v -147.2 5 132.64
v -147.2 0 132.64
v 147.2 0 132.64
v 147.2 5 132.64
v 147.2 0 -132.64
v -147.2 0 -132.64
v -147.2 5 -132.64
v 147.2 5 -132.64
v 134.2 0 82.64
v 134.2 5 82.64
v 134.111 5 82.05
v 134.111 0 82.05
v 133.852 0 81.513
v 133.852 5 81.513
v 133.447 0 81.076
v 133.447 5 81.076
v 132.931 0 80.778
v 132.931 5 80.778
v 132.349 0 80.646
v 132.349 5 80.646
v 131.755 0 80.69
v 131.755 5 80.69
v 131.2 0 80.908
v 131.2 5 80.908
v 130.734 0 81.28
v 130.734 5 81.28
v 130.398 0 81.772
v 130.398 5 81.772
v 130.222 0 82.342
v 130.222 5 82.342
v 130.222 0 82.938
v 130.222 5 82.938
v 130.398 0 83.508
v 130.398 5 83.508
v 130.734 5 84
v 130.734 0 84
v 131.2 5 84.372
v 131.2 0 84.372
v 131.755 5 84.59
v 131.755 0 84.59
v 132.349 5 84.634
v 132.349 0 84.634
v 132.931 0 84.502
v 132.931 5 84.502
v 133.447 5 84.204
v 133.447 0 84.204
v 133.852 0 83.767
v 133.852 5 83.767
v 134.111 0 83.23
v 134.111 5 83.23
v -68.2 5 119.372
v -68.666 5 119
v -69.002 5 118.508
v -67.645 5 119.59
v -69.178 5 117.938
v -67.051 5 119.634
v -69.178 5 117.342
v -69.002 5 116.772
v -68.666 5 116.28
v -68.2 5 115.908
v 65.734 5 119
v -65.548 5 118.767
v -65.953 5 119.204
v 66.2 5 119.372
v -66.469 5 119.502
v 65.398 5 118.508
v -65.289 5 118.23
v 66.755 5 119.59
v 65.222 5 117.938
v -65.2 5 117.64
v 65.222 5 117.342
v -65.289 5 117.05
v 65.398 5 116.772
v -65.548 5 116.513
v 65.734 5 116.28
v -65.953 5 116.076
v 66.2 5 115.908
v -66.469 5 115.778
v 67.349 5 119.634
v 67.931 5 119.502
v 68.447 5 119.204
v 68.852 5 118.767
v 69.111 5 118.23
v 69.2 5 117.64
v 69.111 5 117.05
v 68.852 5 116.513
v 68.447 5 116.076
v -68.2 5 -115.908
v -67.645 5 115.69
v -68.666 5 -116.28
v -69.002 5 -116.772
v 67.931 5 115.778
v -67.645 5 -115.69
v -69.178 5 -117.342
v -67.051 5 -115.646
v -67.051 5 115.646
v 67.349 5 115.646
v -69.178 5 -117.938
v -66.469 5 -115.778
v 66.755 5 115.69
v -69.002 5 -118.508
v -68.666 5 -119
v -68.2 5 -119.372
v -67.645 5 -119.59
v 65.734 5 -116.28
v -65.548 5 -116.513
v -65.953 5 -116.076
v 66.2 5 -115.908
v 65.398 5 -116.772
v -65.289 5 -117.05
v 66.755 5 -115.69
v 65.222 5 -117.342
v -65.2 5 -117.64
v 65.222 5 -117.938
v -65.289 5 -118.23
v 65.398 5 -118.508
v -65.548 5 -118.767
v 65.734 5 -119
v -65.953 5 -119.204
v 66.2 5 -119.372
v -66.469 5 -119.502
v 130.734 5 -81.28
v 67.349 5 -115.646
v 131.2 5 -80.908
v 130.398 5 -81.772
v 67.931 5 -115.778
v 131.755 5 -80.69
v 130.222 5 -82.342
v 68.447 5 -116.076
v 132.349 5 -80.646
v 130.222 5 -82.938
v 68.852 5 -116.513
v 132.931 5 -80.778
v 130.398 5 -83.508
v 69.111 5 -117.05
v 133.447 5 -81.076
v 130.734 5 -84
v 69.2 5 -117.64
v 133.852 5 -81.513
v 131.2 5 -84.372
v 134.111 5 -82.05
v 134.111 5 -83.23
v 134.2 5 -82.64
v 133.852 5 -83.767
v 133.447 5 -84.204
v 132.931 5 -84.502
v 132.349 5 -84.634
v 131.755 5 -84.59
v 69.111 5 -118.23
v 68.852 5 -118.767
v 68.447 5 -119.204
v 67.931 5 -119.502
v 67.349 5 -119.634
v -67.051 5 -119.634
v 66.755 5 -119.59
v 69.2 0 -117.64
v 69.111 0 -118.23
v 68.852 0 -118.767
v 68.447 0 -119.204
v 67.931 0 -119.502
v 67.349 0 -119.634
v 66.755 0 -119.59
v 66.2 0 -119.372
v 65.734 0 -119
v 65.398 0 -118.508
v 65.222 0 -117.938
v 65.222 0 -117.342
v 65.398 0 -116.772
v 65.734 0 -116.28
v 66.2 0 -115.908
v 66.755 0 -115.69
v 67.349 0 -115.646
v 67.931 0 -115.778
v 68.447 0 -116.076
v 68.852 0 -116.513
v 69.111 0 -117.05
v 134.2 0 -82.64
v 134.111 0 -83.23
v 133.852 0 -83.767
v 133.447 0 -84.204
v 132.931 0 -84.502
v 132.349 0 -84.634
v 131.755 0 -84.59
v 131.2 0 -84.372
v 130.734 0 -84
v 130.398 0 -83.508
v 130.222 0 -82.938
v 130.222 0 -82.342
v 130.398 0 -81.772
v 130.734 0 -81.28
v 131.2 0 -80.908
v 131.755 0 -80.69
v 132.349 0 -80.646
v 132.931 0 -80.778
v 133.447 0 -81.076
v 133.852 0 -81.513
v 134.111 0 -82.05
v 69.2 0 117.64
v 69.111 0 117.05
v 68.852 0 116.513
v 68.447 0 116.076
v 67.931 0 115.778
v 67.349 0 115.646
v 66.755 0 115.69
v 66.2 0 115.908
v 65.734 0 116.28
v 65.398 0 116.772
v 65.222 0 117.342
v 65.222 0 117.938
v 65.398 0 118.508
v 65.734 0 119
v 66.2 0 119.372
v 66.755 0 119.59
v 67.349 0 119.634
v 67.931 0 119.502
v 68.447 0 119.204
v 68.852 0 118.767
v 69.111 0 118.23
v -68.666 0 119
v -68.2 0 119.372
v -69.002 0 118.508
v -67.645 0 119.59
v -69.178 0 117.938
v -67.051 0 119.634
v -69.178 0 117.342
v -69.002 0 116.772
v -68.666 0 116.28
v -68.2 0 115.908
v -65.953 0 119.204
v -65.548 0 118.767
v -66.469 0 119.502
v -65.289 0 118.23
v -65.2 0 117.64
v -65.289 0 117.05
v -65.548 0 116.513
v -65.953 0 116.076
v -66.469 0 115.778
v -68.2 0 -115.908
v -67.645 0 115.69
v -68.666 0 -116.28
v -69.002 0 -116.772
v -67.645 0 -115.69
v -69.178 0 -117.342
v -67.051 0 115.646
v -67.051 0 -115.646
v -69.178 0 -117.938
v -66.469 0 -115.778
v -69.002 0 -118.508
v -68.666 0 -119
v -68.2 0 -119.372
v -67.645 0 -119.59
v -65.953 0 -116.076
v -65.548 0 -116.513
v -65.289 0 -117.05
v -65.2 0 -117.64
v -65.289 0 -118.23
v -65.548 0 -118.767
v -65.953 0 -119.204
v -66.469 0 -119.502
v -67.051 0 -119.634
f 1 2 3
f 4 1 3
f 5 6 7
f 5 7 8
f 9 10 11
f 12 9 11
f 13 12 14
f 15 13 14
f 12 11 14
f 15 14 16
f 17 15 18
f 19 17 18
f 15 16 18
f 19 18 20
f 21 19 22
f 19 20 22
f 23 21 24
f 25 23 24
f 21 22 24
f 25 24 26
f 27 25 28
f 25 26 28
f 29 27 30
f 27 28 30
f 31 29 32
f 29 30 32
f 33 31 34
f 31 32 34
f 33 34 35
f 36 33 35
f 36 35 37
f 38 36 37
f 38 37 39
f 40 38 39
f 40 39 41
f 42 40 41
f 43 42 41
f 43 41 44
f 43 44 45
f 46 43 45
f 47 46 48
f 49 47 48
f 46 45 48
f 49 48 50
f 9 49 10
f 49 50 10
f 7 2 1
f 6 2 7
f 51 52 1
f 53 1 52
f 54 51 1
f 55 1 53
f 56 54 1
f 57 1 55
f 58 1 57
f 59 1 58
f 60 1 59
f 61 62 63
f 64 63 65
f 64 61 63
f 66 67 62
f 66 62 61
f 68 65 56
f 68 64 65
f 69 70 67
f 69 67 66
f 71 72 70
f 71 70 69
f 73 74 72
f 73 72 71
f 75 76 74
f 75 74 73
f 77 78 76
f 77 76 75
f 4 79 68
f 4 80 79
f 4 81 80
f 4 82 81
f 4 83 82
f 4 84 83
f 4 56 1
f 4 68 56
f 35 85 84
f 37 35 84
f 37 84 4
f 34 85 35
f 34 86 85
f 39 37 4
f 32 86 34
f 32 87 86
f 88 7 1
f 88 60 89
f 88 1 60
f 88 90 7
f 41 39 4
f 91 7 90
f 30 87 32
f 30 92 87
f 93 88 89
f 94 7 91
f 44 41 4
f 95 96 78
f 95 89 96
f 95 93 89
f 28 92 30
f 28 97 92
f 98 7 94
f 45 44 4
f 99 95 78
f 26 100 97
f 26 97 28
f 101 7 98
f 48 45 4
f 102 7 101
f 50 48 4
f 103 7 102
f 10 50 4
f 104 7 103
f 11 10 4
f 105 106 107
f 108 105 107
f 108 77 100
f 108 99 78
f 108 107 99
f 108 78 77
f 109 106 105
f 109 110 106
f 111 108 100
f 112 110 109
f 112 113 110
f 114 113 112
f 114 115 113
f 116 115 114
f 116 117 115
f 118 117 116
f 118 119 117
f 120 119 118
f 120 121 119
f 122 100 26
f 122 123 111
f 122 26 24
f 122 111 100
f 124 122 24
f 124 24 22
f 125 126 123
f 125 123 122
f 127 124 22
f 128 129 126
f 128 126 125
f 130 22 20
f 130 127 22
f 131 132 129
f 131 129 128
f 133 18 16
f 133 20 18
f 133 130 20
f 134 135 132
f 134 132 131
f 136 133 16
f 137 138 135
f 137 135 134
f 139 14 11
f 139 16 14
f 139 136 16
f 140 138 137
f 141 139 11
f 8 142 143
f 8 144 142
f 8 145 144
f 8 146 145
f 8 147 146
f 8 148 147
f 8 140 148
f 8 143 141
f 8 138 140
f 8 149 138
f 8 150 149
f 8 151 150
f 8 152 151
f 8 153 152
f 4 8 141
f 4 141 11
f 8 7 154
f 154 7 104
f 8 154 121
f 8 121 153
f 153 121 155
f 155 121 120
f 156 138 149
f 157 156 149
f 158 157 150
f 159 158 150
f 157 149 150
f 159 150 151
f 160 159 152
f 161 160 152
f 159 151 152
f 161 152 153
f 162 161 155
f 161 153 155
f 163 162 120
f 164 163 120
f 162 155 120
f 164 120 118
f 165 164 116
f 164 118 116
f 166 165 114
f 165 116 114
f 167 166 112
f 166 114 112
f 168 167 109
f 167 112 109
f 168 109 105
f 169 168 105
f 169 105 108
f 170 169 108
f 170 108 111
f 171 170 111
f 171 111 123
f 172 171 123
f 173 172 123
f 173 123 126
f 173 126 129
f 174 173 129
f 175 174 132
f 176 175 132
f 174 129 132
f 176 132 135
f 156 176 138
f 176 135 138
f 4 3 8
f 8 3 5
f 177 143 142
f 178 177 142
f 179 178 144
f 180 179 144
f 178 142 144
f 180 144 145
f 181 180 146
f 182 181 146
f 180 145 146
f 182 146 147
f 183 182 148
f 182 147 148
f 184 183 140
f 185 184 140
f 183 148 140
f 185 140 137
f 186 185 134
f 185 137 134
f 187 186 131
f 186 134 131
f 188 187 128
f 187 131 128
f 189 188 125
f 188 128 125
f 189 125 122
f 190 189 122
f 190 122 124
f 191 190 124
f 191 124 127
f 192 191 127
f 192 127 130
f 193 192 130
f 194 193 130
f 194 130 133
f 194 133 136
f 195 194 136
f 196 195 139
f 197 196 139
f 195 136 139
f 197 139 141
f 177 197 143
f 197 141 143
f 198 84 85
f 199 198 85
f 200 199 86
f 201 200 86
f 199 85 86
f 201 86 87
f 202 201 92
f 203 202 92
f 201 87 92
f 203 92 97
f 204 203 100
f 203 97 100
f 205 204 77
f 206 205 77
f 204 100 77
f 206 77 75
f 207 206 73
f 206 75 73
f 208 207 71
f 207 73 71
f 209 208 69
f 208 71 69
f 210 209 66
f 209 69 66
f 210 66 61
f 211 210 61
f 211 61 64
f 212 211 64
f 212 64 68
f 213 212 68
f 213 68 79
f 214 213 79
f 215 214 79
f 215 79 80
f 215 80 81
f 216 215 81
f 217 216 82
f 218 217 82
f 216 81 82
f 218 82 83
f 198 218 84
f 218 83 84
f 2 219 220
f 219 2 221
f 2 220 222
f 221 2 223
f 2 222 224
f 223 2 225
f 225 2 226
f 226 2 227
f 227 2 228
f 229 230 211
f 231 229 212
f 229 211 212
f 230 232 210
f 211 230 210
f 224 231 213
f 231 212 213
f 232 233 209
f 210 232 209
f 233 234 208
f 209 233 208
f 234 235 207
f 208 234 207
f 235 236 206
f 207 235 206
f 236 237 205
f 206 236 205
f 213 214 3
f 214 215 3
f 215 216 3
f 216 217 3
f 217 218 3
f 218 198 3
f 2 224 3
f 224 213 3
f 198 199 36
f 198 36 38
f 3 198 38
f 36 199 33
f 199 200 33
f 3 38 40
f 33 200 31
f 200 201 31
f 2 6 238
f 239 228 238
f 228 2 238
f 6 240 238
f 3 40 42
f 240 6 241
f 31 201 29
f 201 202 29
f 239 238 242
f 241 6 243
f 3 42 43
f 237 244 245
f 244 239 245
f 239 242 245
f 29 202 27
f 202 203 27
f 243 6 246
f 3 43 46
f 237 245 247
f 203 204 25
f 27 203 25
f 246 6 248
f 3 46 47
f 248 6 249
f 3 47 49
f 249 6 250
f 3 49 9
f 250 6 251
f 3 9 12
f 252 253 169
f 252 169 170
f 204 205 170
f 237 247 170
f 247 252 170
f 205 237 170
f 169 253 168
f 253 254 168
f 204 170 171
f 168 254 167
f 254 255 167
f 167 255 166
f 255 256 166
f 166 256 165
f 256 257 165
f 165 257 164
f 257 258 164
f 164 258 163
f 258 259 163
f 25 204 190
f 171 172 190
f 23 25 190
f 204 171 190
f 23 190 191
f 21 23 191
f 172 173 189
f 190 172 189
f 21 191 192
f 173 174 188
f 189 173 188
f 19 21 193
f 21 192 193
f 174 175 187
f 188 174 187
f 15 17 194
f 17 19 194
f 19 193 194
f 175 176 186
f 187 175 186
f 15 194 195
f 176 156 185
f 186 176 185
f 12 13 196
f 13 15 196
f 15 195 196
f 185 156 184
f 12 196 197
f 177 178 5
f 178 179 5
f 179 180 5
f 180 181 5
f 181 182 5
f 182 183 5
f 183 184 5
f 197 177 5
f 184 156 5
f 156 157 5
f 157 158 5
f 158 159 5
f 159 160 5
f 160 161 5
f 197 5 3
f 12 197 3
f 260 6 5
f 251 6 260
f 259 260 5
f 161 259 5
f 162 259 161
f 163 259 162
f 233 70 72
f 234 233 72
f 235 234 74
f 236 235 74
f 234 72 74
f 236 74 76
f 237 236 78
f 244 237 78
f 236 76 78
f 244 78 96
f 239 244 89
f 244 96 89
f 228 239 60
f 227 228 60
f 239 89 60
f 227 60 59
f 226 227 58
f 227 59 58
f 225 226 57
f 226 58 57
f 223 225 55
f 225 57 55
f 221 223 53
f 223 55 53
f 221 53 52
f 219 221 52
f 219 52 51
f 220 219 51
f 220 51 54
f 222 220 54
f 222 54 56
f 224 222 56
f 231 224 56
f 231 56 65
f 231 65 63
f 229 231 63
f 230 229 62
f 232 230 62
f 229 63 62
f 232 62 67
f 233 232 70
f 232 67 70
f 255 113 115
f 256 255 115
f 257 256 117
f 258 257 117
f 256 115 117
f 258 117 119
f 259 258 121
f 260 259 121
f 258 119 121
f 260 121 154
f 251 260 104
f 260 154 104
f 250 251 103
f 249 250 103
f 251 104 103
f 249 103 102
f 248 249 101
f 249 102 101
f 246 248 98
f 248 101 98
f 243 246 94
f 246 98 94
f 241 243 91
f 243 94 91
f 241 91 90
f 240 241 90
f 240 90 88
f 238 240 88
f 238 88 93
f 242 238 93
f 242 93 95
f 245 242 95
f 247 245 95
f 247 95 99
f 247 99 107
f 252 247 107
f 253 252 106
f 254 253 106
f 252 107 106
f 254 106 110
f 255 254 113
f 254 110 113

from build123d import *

# Parameters (mm, degrees)
SKETCH1_W           = 294.4
SKETCH1_H           = 265.28
BOSS_EXTRUDE1_DEPTH = 5
SKETCH2_R           = 2
CUT_EXTRUDE1_DEPTH  = 5
SKETCH3_R           = 2
CUT_EXTRUDE2_DEPTH  = 5


with BuildPart() as part:
    # Sketch1 → Boss-Extrude1 (new body)
    with BuildSketch(Plane(origin=(0, 0, 0), x_dir=(1, 0, 0), z_dir=(0, 1, 0))):
        Rectangle(SKETCH1_W, SKETCH1_H)
    extrude(amount=BOSS_EXTRUDE1_DEPTH)

    # Sketch2 → Cut-Extrude1 (cut)
    with BuildSketch(Plane(origin=(0, 5, 0), x_dir=(1, 0, 0), z_dir=(0, 1, 0))):
        with Locations((132.2, -82.64)):
            Circle(SKETCH2_R)
        with Locations((132.2, 82.64)):
            Circle(SKETCH2_R)
    extrude(amount=-CUT_EXTRUDE1_DEPTH, mode=Mode.SUBTRACT)

    # Sketch3 → Cut-Extrude2 (cut)
    with BuildSketch(Plane(origin=(0, 5, 0), x_dir=(1, 0, 0), z_dir=(0, 1, 0))):
        with Locations((-67.2, 117.64)):
            Circle(SKETCH3_R)
        with Locations((67.2, 117.64)):
            Circle(SKETCH3_R)
        with Locations((67.2, -117.64)):
            Circle(SKETCH3_R)
        with Locations((-67.2, -117.64)):
            Circle(SKETCH3_R)
    extrude(amount=-CUT_EXTRUDE2_DEPTH, mode=Mode.SUBTRACT)


solid = part.part
